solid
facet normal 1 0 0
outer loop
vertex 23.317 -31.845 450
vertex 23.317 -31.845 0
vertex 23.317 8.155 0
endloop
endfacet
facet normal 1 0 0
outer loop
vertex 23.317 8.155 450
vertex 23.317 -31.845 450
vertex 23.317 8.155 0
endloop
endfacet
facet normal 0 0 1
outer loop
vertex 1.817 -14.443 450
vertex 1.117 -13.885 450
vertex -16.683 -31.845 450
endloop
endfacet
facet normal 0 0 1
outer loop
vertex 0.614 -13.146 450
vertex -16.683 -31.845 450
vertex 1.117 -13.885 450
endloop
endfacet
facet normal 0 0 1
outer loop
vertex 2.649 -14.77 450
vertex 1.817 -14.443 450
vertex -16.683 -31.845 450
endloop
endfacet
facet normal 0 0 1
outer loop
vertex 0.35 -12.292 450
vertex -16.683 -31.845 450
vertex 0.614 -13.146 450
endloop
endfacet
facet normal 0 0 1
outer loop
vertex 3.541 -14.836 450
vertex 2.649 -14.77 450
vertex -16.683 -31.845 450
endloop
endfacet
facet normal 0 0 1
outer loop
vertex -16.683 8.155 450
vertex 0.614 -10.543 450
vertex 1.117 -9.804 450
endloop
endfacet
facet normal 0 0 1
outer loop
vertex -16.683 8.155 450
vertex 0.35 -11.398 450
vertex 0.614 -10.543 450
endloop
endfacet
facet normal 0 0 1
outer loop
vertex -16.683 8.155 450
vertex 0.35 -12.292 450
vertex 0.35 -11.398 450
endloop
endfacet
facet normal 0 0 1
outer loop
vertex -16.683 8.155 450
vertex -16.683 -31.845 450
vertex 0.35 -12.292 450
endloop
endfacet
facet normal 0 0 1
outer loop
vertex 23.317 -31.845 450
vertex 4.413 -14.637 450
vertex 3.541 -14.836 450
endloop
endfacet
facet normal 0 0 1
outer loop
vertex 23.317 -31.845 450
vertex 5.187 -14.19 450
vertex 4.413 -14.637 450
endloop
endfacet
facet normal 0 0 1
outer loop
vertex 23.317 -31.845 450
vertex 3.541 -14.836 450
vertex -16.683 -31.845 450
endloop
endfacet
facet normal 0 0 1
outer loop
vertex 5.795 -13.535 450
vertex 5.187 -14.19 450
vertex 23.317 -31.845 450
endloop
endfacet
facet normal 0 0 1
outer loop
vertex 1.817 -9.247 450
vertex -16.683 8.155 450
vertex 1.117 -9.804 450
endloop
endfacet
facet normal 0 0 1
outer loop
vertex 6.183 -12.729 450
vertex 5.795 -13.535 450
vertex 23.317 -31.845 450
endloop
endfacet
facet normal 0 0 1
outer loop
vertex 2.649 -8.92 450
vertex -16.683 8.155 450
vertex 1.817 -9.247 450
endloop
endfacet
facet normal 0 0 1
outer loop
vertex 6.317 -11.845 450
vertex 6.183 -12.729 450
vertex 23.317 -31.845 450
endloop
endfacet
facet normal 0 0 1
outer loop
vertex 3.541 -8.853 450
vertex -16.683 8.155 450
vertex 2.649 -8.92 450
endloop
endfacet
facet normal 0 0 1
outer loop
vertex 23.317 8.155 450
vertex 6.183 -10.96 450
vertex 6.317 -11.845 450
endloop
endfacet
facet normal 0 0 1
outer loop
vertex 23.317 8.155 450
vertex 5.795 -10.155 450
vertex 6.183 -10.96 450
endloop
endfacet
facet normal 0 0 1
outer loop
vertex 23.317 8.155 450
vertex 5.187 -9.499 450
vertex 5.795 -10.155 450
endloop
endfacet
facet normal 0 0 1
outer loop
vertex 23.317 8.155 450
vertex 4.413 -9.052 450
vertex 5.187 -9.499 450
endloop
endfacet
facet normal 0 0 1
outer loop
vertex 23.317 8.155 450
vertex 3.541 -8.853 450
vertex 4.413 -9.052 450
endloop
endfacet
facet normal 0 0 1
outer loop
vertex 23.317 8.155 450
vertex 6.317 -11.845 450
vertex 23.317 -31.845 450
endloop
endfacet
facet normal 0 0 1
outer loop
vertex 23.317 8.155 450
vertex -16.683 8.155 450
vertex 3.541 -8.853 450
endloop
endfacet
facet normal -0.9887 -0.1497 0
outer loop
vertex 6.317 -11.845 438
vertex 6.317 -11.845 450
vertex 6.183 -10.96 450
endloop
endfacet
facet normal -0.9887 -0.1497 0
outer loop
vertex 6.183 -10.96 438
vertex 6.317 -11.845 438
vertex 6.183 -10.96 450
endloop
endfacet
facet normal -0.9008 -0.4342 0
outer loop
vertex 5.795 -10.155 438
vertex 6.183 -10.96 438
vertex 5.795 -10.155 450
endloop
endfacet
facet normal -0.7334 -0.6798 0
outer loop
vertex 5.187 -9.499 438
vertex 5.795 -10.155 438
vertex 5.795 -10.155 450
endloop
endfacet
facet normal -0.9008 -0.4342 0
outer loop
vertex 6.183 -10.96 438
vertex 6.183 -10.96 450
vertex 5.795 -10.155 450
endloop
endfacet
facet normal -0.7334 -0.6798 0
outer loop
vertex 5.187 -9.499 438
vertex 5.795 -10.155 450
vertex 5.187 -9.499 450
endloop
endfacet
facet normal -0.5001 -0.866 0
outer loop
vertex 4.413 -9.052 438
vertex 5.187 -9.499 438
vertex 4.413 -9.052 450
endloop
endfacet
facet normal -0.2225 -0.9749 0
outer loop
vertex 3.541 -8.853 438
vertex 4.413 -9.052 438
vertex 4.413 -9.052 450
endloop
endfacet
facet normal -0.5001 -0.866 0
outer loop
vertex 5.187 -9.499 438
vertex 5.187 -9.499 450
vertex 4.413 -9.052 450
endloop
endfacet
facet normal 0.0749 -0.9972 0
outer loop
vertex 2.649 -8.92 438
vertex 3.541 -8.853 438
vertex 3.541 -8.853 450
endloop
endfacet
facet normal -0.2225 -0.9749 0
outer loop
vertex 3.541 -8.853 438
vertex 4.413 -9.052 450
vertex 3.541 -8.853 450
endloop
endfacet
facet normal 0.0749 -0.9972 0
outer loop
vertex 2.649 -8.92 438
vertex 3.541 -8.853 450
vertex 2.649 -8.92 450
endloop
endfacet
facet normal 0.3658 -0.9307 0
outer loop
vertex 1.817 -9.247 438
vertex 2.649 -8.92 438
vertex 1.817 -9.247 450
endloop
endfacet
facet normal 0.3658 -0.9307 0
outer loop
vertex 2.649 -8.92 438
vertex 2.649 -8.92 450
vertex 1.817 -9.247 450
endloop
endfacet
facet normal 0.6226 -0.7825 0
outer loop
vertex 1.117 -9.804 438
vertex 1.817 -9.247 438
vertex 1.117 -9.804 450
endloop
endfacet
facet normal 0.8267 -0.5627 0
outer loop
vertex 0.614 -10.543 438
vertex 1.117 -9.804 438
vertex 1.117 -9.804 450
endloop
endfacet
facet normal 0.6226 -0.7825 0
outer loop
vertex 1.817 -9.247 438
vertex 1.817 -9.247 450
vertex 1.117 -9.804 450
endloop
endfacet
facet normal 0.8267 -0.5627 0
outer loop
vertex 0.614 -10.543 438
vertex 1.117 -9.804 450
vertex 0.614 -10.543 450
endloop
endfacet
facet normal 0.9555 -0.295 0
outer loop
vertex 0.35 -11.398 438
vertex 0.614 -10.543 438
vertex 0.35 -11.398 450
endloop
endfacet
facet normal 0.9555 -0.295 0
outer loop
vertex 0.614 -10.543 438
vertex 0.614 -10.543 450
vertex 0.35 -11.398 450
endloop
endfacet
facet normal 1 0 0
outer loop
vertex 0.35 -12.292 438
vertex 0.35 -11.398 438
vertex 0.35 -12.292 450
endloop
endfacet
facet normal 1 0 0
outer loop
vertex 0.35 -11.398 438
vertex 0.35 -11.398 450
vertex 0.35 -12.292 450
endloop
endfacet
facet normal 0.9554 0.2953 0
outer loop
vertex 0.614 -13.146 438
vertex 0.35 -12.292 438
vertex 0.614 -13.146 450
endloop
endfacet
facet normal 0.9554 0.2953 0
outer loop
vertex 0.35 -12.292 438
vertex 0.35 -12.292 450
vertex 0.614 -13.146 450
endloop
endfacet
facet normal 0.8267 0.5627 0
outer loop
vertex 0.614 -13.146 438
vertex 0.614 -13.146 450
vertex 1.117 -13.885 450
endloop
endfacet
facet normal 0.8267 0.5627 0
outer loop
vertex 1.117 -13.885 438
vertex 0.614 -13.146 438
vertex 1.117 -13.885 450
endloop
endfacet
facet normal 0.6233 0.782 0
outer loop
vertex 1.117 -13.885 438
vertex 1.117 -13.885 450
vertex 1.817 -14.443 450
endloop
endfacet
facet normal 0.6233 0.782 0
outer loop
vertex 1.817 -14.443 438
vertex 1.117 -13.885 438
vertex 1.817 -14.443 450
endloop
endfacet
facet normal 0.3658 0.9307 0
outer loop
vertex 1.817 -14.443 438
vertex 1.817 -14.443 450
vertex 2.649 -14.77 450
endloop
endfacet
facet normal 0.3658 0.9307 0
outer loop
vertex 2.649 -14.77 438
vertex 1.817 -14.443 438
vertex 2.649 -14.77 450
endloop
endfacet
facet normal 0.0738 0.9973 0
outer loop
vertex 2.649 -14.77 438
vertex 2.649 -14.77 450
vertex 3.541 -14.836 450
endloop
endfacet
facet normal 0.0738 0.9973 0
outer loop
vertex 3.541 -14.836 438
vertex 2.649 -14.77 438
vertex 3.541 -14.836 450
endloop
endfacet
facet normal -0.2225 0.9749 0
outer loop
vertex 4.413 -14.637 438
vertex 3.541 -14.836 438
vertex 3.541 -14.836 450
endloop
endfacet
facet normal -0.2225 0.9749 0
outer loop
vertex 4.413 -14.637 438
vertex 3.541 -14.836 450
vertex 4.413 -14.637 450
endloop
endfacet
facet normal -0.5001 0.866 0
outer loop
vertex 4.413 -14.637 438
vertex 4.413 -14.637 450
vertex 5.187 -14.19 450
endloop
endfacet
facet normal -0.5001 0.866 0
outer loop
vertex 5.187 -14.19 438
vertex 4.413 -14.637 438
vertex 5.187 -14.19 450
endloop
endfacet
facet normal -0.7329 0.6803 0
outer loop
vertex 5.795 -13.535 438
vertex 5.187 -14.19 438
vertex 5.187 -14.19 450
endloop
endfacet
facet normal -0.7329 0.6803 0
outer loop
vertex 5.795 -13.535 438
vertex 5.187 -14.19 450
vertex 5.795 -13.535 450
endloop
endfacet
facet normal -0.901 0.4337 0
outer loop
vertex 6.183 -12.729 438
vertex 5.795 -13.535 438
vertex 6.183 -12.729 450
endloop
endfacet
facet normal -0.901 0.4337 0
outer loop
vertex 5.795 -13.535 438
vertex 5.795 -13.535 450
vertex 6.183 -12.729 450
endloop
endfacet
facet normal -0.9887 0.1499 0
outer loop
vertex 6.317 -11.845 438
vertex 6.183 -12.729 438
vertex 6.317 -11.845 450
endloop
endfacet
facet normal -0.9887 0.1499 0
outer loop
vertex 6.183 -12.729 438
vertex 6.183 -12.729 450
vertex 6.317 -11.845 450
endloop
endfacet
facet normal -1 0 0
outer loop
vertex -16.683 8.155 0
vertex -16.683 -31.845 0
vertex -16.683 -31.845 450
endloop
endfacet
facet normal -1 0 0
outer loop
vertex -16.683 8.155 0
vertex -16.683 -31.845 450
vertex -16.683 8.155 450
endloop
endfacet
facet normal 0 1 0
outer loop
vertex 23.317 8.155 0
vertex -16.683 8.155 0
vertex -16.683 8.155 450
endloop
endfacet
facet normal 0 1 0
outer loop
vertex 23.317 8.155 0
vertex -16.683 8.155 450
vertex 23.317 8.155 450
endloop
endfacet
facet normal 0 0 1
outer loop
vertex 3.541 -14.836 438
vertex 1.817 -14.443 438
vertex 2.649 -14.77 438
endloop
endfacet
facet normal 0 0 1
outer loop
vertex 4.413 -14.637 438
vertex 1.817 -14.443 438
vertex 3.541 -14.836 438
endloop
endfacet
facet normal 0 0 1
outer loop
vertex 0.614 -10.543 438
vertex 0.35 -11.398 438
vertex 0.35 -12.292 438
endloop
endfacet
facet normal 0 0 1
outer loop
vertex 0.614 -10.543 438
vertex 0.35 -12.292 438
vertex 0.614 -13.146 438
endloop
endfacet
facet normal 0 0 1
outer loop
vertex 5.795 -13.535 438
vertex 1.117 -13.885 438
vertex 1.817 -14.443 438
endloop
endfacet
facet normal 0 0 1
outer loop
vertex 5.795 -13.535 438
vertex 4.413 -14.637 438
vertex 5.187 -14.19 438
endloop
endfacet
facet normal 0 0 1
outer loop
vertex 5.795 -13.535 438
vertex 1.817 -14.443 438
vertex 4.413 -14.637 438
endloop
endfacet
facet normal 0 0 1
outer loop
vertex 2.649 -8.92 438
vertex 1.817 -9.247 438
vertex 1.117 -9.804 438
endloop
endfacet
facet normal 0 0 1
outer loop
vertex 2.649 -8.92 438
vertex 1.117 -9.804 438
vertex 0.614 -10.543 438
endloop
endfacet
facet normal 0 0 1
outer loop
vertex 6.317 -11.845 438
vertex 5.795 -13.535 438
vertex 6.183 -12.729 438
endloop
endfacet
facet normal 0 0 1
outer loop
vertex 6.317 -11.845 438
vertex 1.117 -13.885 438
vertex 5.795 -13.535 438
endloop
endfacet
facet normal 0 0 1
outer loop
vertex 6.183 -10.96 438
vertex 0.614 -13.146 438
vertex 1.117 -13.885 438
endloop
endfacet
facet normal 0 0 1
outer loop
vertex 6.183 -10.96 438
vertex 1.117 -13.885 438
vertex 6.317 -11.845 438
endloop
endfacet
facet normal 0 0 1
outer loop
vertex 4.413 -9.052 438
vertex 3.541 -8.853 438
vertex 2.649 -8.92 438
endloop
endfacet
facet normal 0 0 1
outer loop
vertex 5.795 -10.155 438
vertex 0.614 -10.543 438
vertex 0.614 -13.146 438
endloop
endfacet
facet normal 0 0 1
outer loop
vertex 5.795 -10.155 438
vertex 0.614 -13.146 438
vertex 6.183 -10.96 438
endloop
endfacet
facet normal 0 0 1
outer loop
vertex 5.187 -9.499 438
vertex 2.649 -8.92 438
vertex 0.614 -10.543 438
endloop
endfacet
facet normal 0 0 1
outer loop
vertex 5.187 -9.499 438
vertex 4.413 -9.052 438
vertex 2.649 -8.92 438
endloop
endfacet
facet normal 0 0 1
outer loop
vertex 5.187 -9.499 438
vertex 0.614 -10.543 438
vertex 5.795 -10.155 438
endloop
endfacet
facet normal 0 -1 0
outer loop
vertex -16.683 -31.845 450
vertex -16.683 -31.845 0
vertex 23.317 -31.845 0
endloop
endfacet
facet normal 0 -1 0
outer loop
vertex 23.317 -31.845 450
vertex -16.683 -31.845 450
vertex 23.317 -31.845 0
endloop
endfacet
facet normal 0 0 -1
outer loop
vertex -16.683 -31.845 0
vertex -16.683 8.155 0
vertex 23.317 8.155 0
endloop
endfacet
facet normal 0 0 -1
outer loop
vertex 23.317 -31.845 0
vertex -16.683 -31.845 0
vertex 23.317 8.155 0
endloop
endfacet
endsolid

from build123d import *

# Parameters (mm, degrees)
F0_W     = 40
F0_H     = 40
F1_DEPTH = 450
F2_R     = 5
F3_DEPTH = 10
F4_DEPTH = 10
F5_R     = 3
F6_DEPTH = 12


# Not quite as in the source:
# - a feature of the source that left no trace in its solid (it failed there, or was rolled back) is left out


with BuildPart() as f1:
    # F0 (on Top) → F1 (new body)
    with BuildSketch(Plane.XY):
        with Locations((3.3165360987, -11.8447574973)):
            Rectangle(F0_W, F0_H)
    extrude(amount=F1_DEPTH)

    # F2 (on face) → F3 (join)
    with BuildSketch(Plane.XY.offset(450)):
        with Locations((3.3165360987, -11.8447574973)):
            Circle(F2_R)
    extrude(amount=F3_DEPTH)

    # F4 (cut): a face of the model
    f4_faces = [f1.faces().sort_by_distance(p)[0] for p in [
        (3.3165360987, -11.8447574973, 460),
    ]]
    extrude(f4_faces, amount=-F4_DEPTH, mode=Mode.SUBTRACT)

    # F5 (on face) → F6 (cut)
    with BuildSketch(Plane.XY.offset(450)):
        with Locations((3.3165360987, -11.8447574973)):
            Circle(F5_R)
    extrude(amount=-F6_DEPTH, mode=Mode.SUBTRACT)


solid = f1.part
